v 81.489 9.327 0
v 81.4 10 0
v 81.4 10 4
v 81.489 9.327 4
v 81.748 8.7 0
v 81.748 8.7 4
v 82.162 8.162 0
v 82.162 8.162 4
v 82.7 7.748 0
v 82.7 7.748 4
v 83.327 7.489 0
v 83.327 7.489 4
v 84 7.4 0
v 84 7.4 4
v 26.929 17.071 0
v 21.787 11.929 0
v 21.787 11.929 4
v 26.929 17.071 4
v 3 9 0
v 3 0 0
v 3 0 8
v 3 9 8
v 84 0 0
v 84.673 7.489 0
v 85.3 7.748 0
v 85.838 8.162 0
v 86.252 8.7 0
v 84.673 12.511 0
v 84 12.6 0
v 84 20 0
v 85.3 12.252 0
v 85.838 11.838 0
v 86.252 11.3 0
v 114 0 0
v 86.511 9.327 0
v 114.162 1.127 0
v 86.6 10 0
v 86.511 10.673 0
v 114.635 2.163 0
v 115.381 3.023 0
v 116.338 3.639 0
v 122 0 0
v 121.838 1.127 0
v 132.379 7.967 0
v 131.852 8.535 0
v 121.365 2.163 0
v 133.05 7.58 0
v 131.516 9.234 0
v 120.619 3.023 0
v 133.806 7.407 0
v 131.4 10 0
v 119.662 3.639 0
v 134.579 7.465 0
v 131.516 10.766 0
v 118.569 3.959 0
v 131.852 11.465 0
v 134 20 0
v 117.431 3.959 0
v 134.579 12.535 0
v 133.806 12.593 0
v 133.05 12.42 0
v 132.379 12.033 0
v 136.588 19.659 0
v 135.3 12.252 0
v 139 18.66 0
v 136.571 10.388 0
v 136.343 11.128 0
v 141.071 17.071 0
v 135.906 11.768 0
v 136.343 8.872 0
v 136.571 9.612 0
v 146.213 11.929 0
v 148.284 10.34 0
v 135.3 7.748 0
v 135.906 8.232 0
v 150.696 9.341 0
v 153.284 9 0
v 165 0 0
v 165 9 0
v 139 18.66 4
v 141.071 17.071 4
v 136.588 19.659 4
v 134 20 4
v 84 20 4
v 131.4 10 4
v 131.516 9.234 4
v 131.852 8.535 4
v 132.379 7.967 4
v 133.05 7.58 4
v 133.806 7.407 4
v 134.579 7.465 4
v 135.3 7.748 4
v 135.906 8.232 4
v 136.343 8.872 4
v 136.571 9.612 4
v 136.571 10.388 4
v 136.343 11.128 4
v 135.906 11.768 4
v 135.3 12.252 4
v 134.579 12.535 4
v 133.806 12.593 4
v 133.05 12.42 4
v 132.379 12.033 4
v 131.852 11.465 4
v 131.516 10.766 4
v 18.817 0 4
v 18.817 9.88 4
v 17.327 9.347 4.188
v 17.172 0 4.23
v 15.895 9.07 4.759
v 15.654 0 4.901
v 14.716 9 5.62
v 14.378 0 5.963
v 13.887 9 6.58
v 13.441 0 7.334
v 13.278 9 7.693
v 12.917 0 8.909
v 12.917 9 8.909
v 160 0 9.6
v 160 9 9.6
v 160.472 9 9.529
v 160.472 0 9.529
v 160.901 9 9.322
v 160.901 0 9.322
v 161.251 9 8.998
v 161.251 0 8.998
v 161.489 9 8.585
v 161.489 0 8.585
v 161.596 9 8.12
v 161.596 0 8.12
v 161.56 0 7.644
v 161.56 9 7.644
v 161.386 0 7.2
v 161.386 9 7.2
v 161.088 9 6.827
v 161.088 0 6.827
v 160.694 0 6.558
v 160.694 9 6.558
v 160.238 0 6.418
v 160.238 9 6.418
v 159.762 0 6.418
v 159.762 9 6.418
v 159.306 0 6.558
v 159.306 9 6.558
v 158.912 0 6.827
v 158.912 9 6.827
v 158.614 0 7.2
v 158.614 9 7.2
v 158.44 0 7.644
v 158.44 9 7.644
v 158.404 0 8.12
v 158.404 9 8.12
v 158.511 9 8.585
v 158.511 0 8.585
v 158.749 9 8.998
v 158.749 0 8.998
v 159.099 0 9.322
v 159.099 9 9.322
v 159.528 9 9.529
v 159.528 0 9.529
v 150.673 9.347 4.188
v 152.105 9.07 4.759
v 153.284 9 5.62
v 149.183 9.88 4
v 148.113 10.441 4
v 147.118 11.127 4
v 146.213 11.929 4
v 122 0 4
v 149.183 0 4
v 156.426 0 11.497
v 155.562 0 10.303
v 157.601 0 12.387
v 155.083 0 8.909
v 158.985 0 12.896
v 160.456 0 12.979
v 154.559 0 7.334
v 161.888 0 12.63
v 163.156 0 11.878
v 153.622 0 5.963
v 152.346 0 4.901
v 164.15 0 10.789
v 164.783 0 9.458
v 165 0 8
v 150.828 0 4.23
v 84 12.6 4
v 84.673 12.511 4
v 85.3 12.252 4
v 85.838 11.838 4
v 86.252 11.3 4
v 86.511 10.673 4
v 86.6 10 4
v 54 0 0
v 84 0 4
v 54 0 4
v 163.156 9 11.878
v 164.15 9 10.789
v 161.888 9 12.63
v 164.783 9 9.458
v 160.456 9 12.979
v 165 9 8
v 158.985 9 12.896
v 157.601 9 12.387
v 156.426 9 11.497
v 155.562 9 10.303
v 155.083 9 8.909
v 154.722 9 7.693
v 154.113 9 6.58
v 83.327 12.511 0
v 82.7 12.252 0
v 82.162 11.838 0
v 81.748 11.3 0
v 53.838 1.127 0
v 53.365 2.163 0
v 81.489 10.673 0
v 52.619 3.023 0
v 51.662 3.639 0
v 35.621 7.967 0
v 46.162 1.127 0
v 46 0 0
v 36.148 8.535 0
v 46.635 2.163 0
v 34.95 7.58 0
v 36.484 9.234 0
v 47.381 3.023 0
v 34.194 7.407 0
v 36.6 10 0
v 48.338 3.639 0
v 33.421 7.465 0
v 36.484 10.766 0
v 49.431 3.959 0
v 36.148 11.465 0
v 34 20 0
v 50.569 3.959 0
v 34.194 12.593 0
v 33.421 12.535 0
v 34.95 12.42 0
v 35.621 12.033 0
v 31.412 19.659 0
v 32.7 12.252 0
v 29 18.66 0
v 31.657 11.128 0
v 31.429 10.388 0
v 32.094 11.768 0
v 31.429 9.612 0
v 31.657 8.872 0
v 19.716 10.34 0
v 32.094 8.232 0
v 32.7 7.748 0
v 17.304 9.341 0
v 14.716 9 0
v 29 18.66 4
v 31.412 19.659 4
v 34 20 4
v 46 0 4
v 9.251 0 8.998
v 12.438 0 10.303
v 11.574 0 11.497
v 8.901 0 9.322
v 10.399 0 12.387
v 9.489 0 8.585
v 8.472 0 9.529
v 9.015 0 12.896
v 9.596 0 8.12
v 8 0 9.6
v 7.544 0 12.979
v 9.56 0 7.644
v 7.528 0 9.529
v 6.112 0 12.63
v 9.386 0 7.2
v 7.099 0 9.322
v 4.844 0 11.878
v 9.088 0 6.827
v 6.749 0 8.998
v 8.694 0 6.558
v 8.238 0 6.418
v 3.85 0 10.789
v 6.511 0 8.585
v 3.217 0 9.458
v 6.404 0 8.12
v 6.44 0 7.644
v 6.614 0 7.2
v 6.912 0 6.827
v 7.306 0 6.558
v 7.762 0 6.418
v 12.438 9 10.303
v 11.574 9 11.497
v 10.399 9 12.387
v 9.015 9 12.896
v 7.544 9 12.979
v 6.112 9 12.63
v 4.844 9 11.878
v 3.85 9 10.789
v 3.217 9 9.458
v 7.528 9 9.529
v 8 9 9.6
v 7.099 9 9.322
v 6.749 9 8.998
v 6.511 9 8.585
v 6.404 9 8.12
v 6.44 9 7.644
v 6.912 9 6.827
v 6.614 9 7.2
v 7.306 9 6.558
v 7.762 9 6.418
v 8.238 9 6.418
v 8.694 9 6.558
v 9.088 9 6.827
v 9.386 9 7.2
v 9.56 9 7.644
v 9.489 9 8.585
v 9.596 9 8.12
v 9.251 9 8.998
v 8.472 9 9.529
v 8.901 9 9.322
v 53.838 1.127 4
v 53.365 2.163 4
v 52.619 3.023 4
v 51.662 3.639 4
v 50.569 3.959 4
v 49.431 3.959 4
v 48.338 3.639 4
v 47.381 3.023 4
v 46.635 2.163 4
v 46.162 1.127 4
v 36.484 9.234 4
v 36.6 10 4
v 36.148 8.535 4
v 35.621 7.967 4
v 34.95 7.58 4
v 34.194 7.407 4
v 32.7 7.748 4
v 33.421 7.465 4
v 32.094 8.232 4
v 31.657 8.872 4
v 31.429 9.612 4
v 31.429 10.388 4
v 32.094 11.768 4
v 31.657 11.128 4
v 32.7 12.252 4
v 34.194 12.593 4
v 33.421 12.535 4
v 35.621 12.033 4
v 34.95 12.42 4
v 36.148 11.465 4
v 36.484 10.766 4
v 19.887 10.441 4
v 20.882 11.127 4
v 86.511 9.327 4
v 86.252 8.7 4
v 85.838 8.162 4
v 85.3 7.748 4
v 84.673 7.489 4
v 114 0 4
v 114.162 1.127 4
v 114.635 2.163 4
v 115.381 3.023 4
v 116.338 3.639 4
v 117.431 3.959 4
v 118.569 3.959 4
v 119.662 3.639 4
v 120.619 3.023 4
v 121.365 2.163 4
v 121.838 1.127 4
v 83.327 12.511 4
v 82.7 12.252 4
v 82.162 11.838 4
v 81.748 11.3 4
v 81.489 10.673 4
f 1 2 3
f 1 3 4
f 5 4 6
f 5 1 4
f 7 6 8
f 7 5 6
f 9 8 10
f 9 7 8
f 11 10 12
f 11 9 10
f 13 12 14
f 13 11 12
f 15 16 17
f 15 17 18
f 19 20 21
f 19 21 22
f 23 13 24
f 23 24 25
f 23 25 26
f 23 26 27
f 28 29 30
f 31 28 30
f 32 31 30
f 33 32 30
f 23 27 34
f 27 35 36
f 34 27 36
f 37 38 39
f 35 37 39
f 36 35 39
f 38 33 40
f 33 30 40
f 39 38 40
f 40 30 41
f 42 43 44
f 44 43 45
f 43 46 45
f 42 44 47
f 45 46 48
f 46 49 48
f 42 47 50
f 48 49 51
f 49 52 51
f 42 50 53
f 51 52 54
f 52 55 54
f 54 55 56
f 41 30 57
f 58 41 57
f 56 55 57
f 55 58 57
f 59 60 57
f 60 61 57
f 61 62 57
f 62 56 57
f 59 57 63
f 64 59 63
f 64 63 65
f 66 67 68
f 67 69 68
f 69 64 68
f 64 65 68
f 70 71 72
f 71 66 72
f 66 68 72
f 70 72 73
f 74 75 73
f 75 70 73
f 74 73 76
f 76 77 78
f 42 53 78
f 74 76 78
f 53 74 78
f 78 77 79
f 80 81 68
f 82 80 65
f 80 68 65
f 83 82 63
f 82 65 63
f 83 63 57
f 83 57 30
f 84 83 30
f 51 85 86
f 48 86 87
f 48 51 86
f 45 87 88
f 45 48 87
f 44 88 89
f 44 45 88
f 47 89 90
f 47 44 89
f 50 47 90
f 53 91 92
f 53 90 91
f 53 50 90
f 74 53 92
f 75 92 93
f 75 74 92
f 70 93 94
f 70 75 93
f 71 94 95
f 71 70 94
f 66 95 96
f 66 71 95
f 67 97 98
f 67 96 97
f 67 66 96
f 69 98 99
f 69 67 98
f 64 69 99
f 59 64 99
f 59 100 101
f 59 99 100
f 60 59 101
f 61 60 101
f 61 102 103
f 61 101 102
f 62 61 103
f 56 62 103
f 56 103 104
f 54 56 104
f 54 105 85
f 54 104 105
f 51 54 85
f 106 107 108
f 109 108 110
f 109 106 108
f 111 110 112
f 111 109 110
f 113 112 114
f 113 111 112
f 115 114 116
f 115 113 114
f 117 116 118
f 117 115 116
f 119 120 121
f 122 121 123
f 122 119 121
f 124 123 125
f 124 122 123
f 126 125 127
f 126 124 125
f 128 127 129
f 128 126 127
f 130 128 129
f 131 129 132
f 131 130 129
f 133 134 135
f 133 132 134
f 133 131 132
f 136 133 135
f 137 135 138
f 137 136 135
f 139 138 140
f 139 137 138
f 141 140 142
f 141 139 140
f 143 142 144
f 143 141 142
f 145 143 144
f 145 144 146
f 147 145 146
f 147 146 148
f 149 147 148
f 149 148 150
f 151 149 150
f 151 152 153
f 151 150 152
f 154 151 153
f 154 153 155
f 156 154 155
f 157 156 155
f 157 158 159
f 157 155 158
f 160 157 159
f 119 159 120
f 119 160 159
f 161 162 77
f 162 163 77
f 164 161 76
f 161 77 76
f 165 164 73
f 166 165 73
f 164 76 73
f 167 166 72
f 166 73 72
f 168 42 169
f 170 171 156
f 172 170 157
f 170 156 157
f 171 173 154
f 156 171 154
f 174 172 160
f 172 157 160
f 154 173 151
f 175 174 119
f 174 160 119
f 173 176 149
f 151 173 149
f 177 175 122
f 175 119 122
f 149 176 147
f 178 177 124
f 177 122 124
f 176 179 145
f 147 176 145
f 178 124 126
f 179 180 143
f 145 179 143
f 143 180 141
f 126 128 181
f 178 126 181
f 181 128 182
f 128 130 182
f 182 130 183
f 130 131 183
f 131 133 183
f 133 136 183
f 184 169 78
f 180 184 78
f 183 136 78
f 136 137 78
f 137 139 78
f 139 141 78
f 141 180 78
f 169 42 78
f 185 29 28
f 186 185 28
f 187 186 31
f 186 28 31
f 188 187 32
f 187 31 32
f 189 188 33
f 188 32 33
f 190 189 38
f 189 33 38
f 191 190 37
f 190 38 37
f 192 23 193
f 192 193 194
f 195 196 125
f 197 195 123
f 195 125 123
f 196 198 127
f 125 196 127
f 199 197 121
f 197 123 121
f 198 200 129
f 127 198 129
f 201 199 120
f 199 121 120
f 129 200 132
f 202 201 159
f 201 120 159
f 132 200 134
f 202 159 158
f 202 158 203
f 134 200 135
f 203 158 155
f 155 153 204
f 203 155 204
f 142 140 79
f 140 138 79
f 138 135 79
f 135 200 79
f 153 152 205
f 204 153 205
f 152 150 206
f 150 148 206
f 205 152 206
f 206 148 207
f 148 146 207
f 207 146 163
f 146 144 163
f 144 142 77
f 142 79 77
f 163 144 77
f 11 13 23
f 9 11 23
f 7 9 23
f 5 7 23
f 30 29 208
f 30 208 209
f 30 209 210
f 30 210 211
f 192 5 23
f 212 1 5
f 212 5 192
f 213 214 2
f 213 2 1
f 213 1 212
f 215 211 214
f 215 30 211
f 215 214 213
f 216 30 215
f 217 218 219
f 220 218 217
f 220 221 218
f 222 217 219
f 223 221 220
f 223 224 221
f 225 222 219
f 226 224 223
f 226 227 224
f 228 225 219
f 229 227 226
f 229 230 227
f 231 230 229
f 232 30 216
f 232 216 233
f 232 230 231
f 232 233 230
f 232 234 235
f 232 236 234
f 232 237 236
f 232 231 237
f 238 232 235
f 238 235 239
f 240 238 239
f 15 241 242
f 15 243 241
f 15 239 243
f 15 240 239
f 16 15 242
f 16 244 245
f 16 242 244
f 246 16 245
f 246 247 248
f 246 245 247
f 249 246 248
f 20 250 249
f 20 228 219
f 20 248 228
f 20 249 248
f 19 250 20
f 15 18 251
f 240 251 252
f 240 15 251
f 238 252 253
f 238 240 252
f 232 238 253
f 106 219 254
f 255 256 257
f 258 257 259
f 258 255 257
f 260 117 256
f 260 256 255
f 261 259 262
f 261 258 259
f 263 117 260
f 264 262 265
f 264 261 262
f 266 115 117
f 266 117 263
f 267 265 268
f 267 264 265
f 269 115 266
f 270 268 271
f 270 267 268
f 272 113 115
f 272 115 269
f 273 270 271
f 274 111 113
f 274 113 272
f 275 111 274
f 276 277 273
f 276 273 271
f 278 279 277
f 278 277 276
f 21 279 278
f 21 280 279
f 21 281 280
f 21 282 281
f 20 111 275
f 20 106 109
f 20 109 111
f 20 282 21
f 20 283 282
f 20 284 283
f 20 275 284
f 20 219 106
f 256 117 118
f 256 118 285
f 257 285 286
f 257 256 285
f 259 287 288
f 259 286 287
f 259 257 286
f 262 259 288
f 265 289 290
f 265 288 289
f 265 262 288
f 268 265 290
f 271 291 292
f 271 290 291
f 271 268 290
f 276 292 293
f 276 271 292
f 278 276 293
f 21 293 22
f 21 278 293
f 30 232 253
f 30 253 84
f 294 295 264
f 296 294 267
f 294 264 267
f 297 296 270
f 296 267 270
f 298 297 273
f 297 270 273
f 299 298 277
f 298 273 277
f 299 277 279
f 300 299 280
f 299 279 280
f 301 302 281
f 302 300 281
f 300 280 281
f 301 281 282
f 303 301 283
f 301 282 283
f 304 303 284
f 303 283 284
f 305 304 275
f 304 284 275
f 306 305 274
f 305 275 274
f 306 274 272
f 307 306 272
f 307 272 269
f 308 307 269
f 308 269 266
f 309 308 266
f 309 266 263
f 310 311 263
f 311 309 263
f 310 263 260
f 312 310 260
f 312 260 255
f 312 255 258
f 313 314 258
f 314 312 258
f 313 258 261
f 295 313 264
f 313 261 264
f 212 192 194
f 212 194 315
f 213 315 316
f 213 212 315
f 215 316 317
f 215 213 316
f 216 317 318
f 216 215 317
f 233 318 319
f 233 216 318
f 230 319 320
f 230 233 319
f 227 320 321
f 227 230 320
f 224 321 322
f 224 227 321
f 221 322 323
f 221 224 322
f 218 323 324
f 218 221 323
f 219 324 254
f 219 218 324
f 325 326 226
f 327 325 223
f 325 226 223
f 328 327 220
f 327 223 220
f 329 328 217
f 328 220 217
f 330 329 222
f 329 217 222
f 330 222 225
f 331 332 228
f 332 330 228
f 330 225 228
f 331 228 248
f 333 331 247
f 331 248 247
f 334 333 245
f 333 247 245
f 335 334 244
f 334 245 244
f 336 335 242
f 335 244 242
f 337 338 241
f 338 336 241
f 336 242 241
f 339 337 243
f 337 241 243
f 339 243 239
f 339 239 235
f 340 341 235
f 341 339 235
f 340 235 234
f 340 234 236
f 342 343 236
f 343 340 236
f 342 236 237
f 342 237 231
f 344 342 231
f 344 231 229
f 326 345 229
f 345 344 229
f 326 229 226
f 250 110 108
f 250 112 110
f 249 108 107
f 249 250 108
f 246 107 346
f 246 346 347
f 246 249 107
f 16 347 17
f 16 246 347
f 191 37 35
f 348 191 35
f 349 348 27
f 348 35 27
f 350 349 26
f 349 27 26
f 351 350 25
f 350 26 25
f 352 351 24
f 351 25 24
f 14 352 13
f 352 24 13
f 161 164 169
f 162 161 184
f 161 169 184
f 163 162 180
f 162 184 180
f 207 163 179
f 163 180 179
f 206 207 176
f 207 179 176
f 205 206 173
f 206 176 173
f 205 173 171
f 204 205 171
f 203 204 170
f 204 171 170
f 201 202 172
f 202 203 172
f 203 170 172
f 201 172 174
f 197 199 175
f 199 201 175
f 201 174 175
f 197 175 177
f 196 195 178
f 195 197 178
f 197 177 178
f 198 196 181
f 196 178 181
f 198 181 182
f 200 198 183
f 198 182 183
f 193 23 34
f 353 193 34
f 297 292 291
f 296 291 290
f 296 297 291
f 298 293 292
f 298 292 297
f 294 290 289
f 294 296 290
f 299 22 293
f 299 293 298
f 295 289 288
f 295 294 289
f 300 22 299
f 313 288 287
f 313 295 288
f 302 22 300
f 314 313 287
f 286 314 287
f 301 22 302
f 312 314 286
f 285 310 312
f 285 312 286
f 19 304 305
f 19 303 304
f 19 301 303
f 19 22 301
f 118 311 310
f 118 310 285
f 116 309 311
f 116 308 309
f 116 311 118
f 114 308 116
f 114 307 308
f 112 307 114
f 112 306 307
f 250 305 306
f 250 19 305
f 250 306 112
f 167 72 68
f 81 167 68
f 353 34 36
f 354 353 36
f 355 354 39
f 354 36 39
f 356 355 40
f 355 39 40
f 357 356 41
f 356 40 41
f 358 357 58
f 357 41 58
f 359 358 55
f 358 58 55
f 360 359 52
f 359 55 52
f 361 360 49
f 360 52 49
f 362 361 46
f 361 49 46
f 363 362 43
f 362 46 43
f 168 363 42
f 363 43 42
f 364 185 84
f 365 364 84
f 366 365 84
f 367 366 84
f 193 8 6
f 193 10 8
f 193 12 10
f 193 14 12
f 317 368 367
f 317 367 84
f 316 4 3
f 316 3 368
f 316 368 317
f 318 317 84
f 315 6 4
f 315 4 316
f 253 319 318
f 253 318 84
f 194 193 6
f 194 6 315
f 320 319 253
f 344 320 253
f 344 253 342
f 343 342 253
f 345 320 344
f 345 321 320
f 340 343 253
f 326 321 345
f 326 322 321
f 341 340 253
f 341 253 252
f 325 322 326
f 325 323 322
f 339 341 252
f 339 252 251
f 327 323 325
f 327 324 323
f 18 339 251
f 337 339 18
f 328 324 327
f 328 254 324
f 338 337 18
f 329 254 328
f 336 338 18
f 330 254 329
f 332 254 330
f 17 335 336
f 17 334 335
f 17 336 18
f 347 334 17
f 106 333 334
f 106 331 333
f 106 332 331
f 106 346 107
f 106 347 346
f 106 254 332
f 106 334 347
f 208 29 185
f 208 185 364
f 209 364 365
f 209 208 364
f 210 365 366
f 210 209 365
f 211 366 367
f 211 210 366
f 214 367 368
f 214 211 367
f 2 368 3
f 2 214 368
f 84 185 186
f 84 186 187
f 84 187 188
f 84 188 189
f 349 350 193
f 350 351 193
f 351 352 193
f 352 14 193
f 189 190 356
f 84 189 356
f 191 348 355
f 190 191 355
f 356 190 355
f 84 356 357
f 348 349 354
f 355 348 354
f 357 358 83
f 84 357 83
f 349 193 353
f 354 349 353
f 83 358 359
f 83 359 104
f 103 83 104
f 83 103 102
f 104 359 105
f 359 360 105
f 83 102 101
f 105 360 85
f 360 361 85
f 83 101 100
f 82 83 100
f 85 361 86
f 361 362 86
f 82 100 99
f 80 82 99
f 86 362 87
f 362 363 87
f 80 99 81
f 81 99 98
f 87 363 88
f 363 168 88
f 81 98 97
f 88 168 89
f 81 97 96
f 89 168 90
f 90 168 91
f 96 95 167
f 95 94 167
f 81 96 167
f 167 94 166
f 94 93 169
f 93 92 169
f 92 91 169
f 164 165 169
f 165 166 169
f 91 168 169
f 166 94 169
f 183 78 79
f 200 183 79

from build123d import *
from build123d.topology import SkipClean

# Parameters (mm, degrees)
SKETCH1_R           = 1.6
BOSS_EXTRUDE1_DEPTH = 20
SKETCH3_R           = 2.6
BOSS_EXTRUDE2_DEPTH = 13


with BuildPart() as part:
    # Sketch1 → Boss-Extrude1 (new body)
    with BuildSketch(Plane(origin=(0, 0, 0), x_dir=(1, 0, 0), z_dir=(0, 1, 0))):
        with BuildLine():
            Line((165, -8), (165, 0))
            Line((165, 0), (84, 0))
            Line((84, 0), (84, -4))
            Line((84, -4), (149.183346174, -4))
            ThreePointArc((149.183346174, -4), (153.020959068, -5.387763311), (155.08333917, -8.909090909))
            ThreePointArc((155.08333917, -8.909090909), (160.456451448, -12.979121617), (165, -8))
        make_face()
        with Locations(Location((160, -8, 0), (0, 0, 270))):
            Circle(SKETCH1_R, mode=Mode.SUBTRACT)
    extrude(amount=BOSS_EXTRUDE1_DEPTH)


with BuildPart() as body_2:
    # Sketch3 → Boss-Extrude2 (new, through all)
    with BuildSketch(Plane.XY):
        with BuildLine():
            Line((122, 0), (165, 0))
            Line((165, 0), (165, 9))
            Line((165, 9), (153.284271247, 9))
            ThreePointArc((153.284271247, 9), (149.457436924, 9.761204675), (146.213203436, 11.928932188))
            Line((146.213203436, 11.928932188), (141.071067812, 17.071067812))
            ThreePointArc((141.071067812, 17.071067812), (137.826834324, 19.238795325), (134, 20))
            Line((134, 20), (84, 20))
            Line((84, 20), (84, 12.6))
            ThreePointArc((84, 12.6), (85.838477631, 11.838477631), (86.6, 10))
            ThreePointArc((86.6, 10), (85.838477631, 8.161522369), (84, 7.4))
            Line((84, 7.4), (84, 0))
            Line((84, 0), (114, 0))
            ThreePointArc((114, 0), (118, 4), (122, 0))
        make_face()
        with Locations(Location((134, 10, 0), (0, 0, 180))):
            Circle(SKETCH3_R, mode=Mode.SUBTRACT)
    extrude(amount=BOSS_EXTRUDE2_DEPTH)

    # Intersect1: read off the stored shape, not the designer's step
    # Intersect1: intersect part
    add(part.part, mode=Mode.INTERSECT)

    # Mirror1: body 2 across face


with BuildPart() as body_2_1:
    with SkipClean():  # the faces are left unmerged after this step: merging them gives an invalid solid
        add(body_2.part)
        add(body_2.part.mirror(Plane(origin=(84, 16.3, 2), x_dir=(0, 0, 1), z_dir=(-1, 0, 0))))


solid = body_2_1.part
